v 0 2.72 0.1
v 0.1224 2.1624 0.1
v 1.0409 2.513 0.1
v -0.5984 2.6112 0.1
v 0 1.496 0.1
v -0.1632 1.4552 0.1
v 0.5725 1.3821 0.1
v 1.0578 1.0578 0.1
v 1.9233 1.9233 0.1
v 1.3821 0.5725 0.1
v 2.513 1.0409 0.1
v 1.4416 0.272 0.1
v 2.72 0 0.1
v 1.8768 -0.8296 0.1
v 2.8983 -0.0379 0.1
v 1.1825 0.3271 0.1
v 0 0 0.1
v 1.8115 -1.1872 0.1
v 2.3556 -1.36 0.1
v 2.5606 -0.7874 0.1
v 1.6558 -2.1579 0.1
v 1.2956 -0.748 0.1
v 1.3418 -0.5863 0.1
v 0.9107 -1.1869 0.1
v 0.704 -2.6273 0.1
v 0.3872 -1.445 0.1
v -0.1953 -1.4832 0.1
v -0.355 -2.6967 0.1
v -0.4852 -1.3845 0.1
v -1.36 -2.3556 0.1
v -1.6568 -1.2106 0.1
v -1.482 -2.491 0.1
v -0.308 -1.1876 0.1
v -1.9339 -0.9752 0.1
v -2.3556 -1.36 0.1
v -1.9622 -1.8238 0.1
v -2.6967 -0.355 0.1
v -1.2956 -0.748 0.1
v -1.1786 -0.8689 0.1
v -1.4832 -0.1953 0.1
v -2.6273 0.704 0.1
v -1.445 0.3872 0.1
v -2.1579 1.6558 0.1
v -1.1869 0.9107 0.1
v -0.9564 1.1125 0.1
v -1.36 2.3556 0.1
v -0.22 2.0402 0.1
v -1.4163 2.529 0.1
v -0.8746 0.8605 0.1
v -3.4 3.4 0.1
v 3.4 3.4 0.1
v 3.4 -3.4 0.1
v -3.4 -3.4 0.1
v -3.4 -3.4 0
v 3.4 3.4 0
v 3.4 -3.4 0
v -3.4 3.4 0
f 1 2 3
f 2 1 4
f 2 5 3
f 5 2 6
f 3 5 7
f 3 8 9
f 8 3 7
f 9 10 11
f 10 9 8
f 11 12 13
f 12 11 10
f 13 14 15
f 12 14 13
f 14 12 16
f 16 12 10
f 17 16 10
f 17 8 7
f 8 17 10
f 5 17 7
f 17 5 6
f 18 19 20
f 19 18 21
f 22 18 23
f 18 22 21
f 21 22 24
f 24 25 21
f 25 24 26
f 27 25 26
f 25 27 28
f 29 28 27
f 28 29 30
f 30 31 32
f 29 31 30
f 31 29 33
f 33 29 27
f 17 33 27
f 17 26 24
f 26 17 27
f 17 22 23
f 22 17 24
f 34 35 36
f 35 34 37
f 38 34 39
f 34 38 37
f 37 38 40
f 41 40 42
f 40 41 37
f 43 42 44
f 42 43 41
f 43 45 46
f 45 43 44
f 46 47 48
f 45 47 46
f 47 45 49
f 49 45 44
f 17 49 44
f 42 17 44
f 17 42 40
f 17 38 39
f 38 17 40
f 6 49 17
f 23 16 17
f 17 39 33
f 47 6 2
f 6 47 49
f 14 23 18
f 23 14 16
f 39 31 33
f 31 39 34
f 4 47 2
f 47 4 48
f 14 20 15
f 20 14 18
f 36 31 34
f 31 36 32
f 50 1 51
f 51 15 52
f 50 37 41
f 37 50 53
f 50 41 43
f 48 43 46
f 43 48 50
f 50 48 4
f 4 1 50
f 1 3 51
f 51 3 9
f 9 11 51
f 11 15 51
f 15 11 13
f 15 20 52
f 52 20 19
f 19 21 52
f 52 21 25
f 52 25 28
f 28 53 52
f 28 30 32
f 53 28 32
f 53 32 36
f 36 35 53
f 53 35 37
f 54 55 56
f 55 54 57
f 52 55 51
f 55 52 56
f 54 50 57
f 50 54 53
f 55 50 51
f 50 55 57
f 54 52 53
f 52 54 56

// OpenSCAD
use <../lib.scad>
function ldraw_lib__59718d() = [
// 0 Sticker  0.9 x  0.9 with Round Green/White Arrows
// 0 Name: 59718d.dat
// 0 Author: J.C. Tchang [tchang]
// 0 !LDRAW_ORG Part UPDATE 2025-09
// 0 !LICENSE Licensed under CC BY 4.0 : see CAreadme.txt
// 
// 0 BFC CERTIFY CCW
  [0,"BFC","CERTIFY"],
  [0,"BFC","CCW"],
// 
// 0 !KEYWORDS BrickLink 7991stk01, Rebrickable 59718
// 
// 0 !HISTORY 2012-03-30 [PTadmin] Official Update 2012-01
// 0 !HISTORY 2025-09-27 [OrionP] Changed winding to CCW
// 0 !HISTORY 2025-09-29 [OrionP] Official Update 2025-09
// 
// 4 2 2.6023 -0.25 6.2824 0 -0.25 6.8 -1.496 -0.25 6.528 0.306 -0.25 5.406
  [4,2,2.6023,-0.25,6.2824,0,-0.25,6.8,-1.496,-0.25,6.528,0.306,-0.25,5.406],
// 4 2 0.306 -0.25 5.406 -0.408 -0.25 3.638 0 -0.25 3.74 2.6023 -0.25 6.2824
  [4,2,0.306,-0.25,5.406,-0.408,-0.25,3.638,0,-0.25,3.74,2.6023,-0.25,6.2824],
// 3 2 2.6023 -0.25 6.2824 0 -0.25 3.74 1.4312 -0.25 3.4553
  [3,2,2.6023,-0.25,6.2824,0,-0.25,3.74,1.4312,-0.25,3.4553],
// 4 2 1.4312 -0.25 3.4553 2.6446 -0.25 2.6446 4.8083 -0.25 4.8083 2.6023 -0.25 6.2824
  [4,2,1.4312,-0.25,3.4553,2.6446,-0.25,2.6446,4.8083,-0.25,4.8083,2.6023,-0.25,6.2824],
// 4 2 3.4553 -0.25 1.4312 6.2824 -0.25 2.6023 4.8083 -0.25 4.8083 2.6446 -0.25 2.6446
  [4,2,3.4553,-0.25,1.4312,6.2824,-0.25,2.6023,4.8083,-0.25,4.8083,2.6446,-0.25,2.6446],
// 4 2 3.4553 -0.25 1.4312 3.604 -0.25 0.68 6.8 -0.25 0 6.2824 -0.25 2.6023
  [4,2,3.4553,-0.25,1.4312,3.604,-0.25,0.68,6.8,-0.25,0,6.2824,-0.25,2.6023],
// 3 2 6.8 -0.25 0 4.692 -0.25 -2.074 7.2457 -0.25 -0.0948
  [3,2,6.8,-0.25,0,4.692,-0.25,-2.074,7.2457,-0.25,-0.0948],
// 3 2 3.604 -0.25 0.68 4.692 -0.25 -2.074 6.8 -0.25 0
  [3,2,3.604,-0.25,0.68,4.692,-0.25,-2.074,6.8,-0.25,0],
// 3 2 4.692 -0.25 -2.074 3.604 -0.25 0.68 2.9562 -0.25 0.8178
  [3,2,4.692,-0.25,-2.074,3.604,-0.25,0.68,2.9562,-0.25,0.8178],
// 3 15 2.9562 -0.25 0.8178 3.604 -0.25 0.68 3.4553 -0.25 1.4312
  [3,15,2.9562,-0.25,0.8178,3.604,-0.25,0.68,3.4553,-0.25,1.4312],
// 3 15 0 -0.25 0 2.9562 -0.25 0.8178 3.4553 -0.25 1.4312
  [3,15,0,-0.25,0,2.9562,-0.25,0.8178,3.4553,-0.25,1.4312],
// 4 15 0 -0.25 0 3.4553 -0.25 1.4312 2.6446 -0.25 2.6446 1.4312 -0.25 3.4553
  [4,15,0,-0.25,0,3.4553,-0.25,1.4312,2.6446,-0.25,2.6446,1.4312,-0.25,3.4553],
// 4 15 1.4312 -0.25 3.4553 0 -0.25 3.74 -0.408 -0.25 3.638 0 -0.25 0
  [4,15,1.4312,-0.25,3.4553,0,-0.25,3.74,-0.408,-0.25,3.638,0,-0.25,0],
// 4 2 4.1396 -0.25 -5.3948 5.889 -0.25 -3.4 6.4014 -0.25 -1.9684 4.5287 -0.25 -2.968
  [4,2,4.1396,-0.25,-5.3948,5.889,-0.25,-3.4,6.4014,-0.25,-1.9684,4.5287,-0.25,-2.968],
// 4 2 4.5287 -0.25 -2.968 3.3546 -0.25 -1.4657 3.2389 -0.25 -1.87 4.1396 -0.25 -5.3948
  [4,2,4.5287,-0.25,-2.968,3.3546,-0.25,-1.4657,3.2389,-0.25,-1.87,4.1396,-0.25,-5.3948],
// 3 2 4.1396 -0.25 -5.3948 3.2389 -0.25 -1.87 2.2768 -0.25 -2.9672
  [3,2,4.1396,-0.25,-5.3948,3.2389,-0.25,-1.87,2.2768,-0.25,-2.9672],
// 4 2 2.2768 -0.25 -2.9672 0.968 -0.25 -3.6126 1.76 -0.25 -6.5683 4.1396 -0.25 -5.3948
  [4,2,2.2768,-0.25,-2.9672,0.968,-0.25,-3.6126,1.76,-0.25,-6.5683,4.1396,-0.25,-5.3948],
// 4 2 -0.4882 -0.25 -3.708 -0.8876 -0.25 -6.7418 1.76 -0.25 -6.5683 0.968 -0.25 -3.6126
  [4,2,-0.4882,-0.25,-3.708,-0.8876,-0.25,-6.7418,1.76,-0.25,-6.5683,0.968,-0.25,-3.6126],
// 4 2 -0.4882 -0.25 -3.708 -1.2131 -0.25 -3.4612 -3.4 -0.25 -5.889 -0.8876 -0.25 -6.7418
  [4,2,-0.4882,-0.25,-3.708,-1.2131,-0.25,-3.4612,-3.4,-0.25,-5.889,-0.8876,-0.25,-6.7418],
// 3 2 -3.4 -0.25 -5.889 -4.1421 -0.25 -3.0264 -3.705 -0.25 -6.2275
  [3,2,-3.4,-0.25,-5.889,-4.1421,-0.25,-3.0264,-3.705,-0.25,-6.2275],
// 3 2 -1.2131 -0.25 -3.4612 -4.1421 -0.25 -3.0264 -3.4 -0.25 -5.889
  [3,2,-1.2131,-0.25,-3.4612,-4.1421,-0.25,-3.0264,-3.4,-0.25,-5.889],
// 3 2 -4.1421 -0.25 -3.0264 -1.2131 -0.25 -3.4612 -0.7699 -0.25 -2.9691
  [3,2,-4.1421,-0.25,-3.0264,-1.2131,-0.25,-3.4612,-0.7699,-0.25,-2.9691],
// 3 15 -0.7699 -0.25 -2.9691 -1.2131 -0.25 -3.4612 -0.4882 -0.25 -3.708
  [3,15,-0.7699,-0.25,-2.9691,-1.2131,-0.25,-3.4612,-0.4882,-0.25,-3.708],
// 3 15 0 -0.25 0 -0.7699 -0.25 -2.9691 -0.4882 -0.25 -3.708
  [3,15,0,-0.25,0,-0.7699,-0.25,-2.9691,-0.4882,-0.25,-3.708],
// 4 15 0 -0.25 0 -0.4882 -0.25 -3.708 0.968 -0.25 -3.6126 2.2768 -0.25 -2.9672
  [4,15,0,-0.25,0,-0.4882,-0.25,-3.708,0.968,-0.25,-3.6126,2.2768,-0.25,-2.9672],
// 4 15 2.2768 -0.25 -2.9672 3.2389 -0.25 -1.87 3.3546 -0.25 -1.4657 0 -0.25 0
  [4,15,2.2768,-0.25,-2.9672,3.2389,-0.25,-1.87,3.3546,-0.25,-1.4657,0,-0.25,0],
// 4 2 -6.7418 -0.25 -0.8876 -5.889 -0.25 -3.4 -4.9054 -0.25 -4.5596 -4.8347 -0.25 -2.438
  [4,2,-6.7418,-0.25,-0.8876,-5.889,-0.25,-3.4,-4.9054,-0.25,-4.5596,-4.8347,-0.25,-2.438],
// 4 2 -4.8347 -0.25 -2.438 -2.9466 -0.25 -2.1723 -3.2389 -0.25 -1.87 -6.7418 -0.25 -0.8876
  [4,2,-4.8347,-0.25,-2.438,-2.9466,-0.25,-2.1723,-3.2389,-0.25,-1.87,-6.7418,-0.25,-0.8876],
// 3 2 -6.7418 -0.25 -0.8876 -3.2389 -0.25 -1.87 -3.708 -0.25 -0.4882
  [3,2,-6.7418,-0.25,-0.8876,-3.2389,-0.25,-1.87,-3.708,-0.25,-0.4882],
// 4 2 -3.708 -0.25 -0.4882 -3.6126 -0.25 0.968 -6.5683 -0.25 1.76 -6.7418 -0.25 -0.8876
  [4,2,-3.708,-0.25,-0.4882,-3.6126,-0.25,0.968,-6.5683,-0.25,1.76,-6.7418,-0.25,-0.8876],
// 4 2 -2.9672 -0.25 2.2768 -5.3948 -0.25 4.1396 -6.5683 -0.25 1.76 -3.6126 -0.25 0.968
  [4,2,-2.9672,-0.25,2.2768,-5.3948,-0.25,4.1396,-6.5683,-0.25,1.76,-3.6126,-0.25,0.968],
// 4 2 -2.9672 -0.25 2.2768 -2.3909 -0.25 2.7812 -3.4 -0.25 5.889 -5.3948 -0.25 4.1396
  [4,2,-2.9672,-0.25,2.2768,-2.3909,-0.25,2.7812,-3.4,-0.25,5.889,-5.3948,-0.25,4.1396],
// 3 2 -3.4 -0.25 5.889 -0.5499 -0.25 5.1004 -3.5407 -0.25 6.3224
  [3,2,-3.4,-0.25,5.889,-0.5499,-0.25,5.1004,-3.5407,-0.25,6.3224],
// 3 2 -2.3909 -0.25 2.7812 -0.5499 -0.25 5.1004 -3.4 -0.25 5.889
  [3,2,-2.3909,-0.25,2.7812,-0.5499,-0.25,5.1004,-3.4,-0.25,5.889],
// 3 2 -0.5499 -0.25 5.1004 -2.3909 -0.25 2.7812 -2.1864 -0.25 2.1513
  [3,2,-0.5499,-0.25,5.1004,-2.3909,-0.25,2.7812,-2.1864,-0.25,2.1513],
// 3 15 -2.1864 -0.25 2.1513 -2.3909 -0.25 2.7812 -2.9672 -0.25 2.2768
  [3,15,-2.1864,-0.25,2.1513,-2.3909,-0.25,2.7812,-2.9672,-0.25,2.2768],
// 3 15 0 -0.25 0 -2.1864 -0.25 2.1513 -2.9672 -0.25 2.2768
  [3,15,0,-0.25,0,-2.1864,-0.25,2.1513,-2.9672,-0.25,2.2768],
// 4 15 0 -0.25 0 -2.9672 -0.25 2.2768 -3.6126 -0.25 0.968 -3.708 -0.25 -0.4882
  [4,15,0,-0.25,0,-2.9672,-0.25,2.2768,-3.6126,-0.25,0.968,-3.708,-0.25,-0.4882],
// 4 15 -3.708 -0.25 -0.4882 -3.2389 -0.25 -1.87 -2.9466 -0.25 -2.1723 0 -0.25 0
  [4,15,-3.708,-0.25,-0.4882,-3.2389,-0.25,-1.87,-2.9466,-0.25,-2.1723,0,-0.25,0],
// 3 15 -0.408 -0.25 3.638 -2.1864 -0.25 2.1513 0 -0.25 0
  [3,15,-0.408,-0.25,3.638,-2.1864,-0.25,2.1513,0,-0.25,0],
// 3 15 3.3546 -0.25 -1.4657 2.9562 -0.25 0.8178 0 -0.25 0
  [3,15,3.3546,-0.25,-1.4657,2.9562,-0.25,0.8178,0,-0.25,0],
// 3 15 0 -0.25 0 -2.9466 -0.25 -2.1723 -0.7699 -0.25 -2.9691
  [3,15,0,-0.25,0,-2.9466,-0.25,-2.1723,-0.7699,-0.25,-2.9691],
// 4 15 0.306 -0.25 5.406 -0.5499 -0.25 5.1004 -2.1864 -0.25 2.1513 -0.408 -0.25 3.638
  [4,15,0.306,-0.25,5.406,-0.5499,-0.25,5.1004,-2.1864,-0.25,2.1513,-0.408,-0.25,3.638],
// 4 15 4.5287 -0.25 -2.968 4.692 -0.25 -2.074 2.9562 -0.25 0.8178 3.3546 -0.25 -1.4657
  [4,15,4.5287,-0.25,-2.968,4.692,-0.25,-2.074,2.9562,-0.25,0.8178,3.3546,-0.25,-1.4657],
// 4 15 -4.8347 -0.25 -2.438 -4.1421 -0.25 -3.0264 -0.7699 -0.25 -2.9691 -2.9466 -0.25 -2.1723
  [4,15,-4.8347,-0.25,-2.438,-4.1421,-0.25,-3.0264,-0.7699,-0.25,-2.9691,-2.9466,-0.25,-2.1723],
// 4 15 -1.496 -0.25 6.528 -3.5407 -0.25 6.3224 -0.5499 -0.25 5.1004 0.306 -0.25 5.406
  [4,15,-1.496,-0.25,6.528,-3.5407,-0.25,6.3224,-0.5499,-0.25,5.1004,0.306,-0.25,5.406],
// 4 15 6.4014 -0.25 -1.9684 7.2457 -0.25 -0.0948 4.692 -0.25 -2.074 4.5287 -0.25 -2.968
  [4,15,6.4014,-0.25,-1.9684,7.2457,-0.25,-0.0948,4.692,-0.25,-2.074,4.5287,-0.25,-2.968],
// 4 15 -4.8347 -0.25 -2.438 -4.9054 -0.25 -4.5596 -3.705 -0.25 -6.2275 -4.1421 -0.25 -3.0264
  [4,15,-4.8347,-0.25,-2.438,-4.9054,-0.25,-4.5596,-3.705,-0.25,-6.2275,-4.1421,-0.25,-3.0264],
// 3 15 -8.5 -0.25 8.5 0 -0.25 6.8 8.5 -0.25 8.5
  [3,15,-8.5,-0.25,8.5,0,-0.25,6.8,8.5,-0.25,8.5],
// 3 15 8.5 -0.25 8.5 7.2457 -0.25 -0.0948 8.5 -0.25 -8.5
  [3,15,8.5,-0.25,8.5,7.2457,-0.25,-0.0948,8.5,-0.25,-8.5],
// 4 15 -8.5 -0.25 -8.5 -6.7418 -0.25 -0.8876 -6.5683 -0.25 1.76 -8.5 -0.25 8.5
  [4,15,-8.5,-0.25,-8.5,-6.7418,-0.25,-0.8876,-6.5683,-0.25,1.76,-8.5,-0.25,8.5],
// 3 15 -8.5 -0.25 8.5 -6.5683 -0.25 1.76 -5.3948 -0.25 4.1396
  [3,15,-8.5,-0.25,8.5,-6.5683,-0.25,1.76,-5.3948,-0.25,4.1396],
// 4 15 -8.5 -0.25 8.5 -5.3948 -0.25 4.1396 -3.4 -0.25 5.889 -3.5407 -0.25 6.3224
  [4,15,-8.5,-0.25,8.5,-5.3948,-0.25,4.1396,-3.4,-0.25,5.889,-3.5407,-0.25,6.3224],
// 3 15 -8.5 -0.25 8.5 -3.5407 -0.25 6.3224 -1.496 -0.25 6.528
  [3,15,-8.5,-0.25,8.5,-3.5407,-0.25,6.3224,-1.496,-0.25,6.528],
// 3 15 -1.496 -0.25 6.528 0 -0.25 6.8 -8.5 -0.25 8.5
  [3,15,-1.496,-0.25,6.528,0,-0.25,6.8,-8.5,-0.25,8.5],
// 3 15 0 -0.25 6.8 2.6023 -0.25 6.2824 8.5 -0.25 8.5
  [3,15,0,-0.25,6.8,2.6023,-0.25,6.2824,8.5,-0.25,8.5],
// 3 15 8.5 -0.25 8.5 2.6023 -0.25 6.2824 4.8083 -0.25 4.8083
  [3,15,8.5,-0.25,8.5,2.6023,-0.25,6.2824,4.8083,-0.25,4.8083],
// 3 15 4.8083 -0.25 4.8083 6.2824 -0.25 2.6023 8.5 -0.25 8.5
  [3,15,4.8083,-0.25,4.8083,6.2824,-0.25,2.6023,8.5,-0.25,8.5],
// 4 15 8.5 -0.25 8.5 6.2824 -0.25 2.6023 6.8 -0.25 0 7.2457 -0.25 -0.0948
  [4,15,8.5,-0.25,8.5,6.2824,-0.25,2.6023,6.8,-0.25,0,7.2457,-0.25,-0.0948],
// 3 15 7.2457 -0.25 -0.0948 6.4014 -0.25 -1.9684 8.5 -0.25 -8.5
  [3,15,7.2457,-0.25,-0.0948,6.4014,-0.25,-1.9684,8.5,-0.25,-8.5],
// 3 15 8.5 -0.25 -8.5 6.4014 -0.25 -1.9684 5.889 -0.25 -3.4
  [3,15,8.5,-0.25,-8.5,6.4014,-0.25,-1.9684,5.889,-0.25,-3.4],
// 3 15 5.889 -0.25 -3.4 4.1396 -0.25 -5.3948 8.5 -0.25 -8.5
  [3,15,5.889,-0.25,-3.4,4.1396,-0.25,-5.3948,8.5,-0.25,-8.5],
// 3 15 8.5 -0.25 -8.5 4.1396 -0.25 -5.3948 1.76 -0.25 -6.5683
  [3,15,8.5,-0.25,-8.5,4.1396,-0.25,-5.3948,1.76,-0.25,-6.5683],
// 3 15 8.5 -0.25 -8.5 1.76 -0.25 -6.5683 -0.8876 -0.25 -6.7418
  [3,15,8.5,-0.25,-8.5,1.76,-0.25,-6.5683,-0.8876,-0.25,-6.7418],
// 3 15 -0.8876 -0.25 -6.7418 -8.5 -0.25 -8.5 8.5 -0.25 -8.5
  [3,15,-0.8876,-0.25,-6.7418,-8.5,-0.25,-8.5,8.5,-0.25,-8.5],
// 3 15 -0.8876 -0.25 -6.7418 -3.4 -0.25 -5.889 -3.705 -0.25 -6.2275
  [3,15,-0.8876,-0.25,-6.7418,-3.4,-0.25,-5.889,-3.705,-0.25,-6.2275],
// 3 15 -8.5 -0.25 -8.5 -0.8876 -0.25 -6.7418 -3.705 -0.25 -6.2275
  [3,15,-8.5,-0.25,-8.5,-0.8876,-0.25,-6.7418,-3.705,-0.25,-6.2275],
// 3 15 -8.5 -0.25 -8.5 -3.705 -0.25 -6.2275 -4.9054 -0.25 -4.5596
  [3,15,-8.5,-0.25,-8.5,-3.705,-0.25,-6.2275,-4.9054,-0.25,-4.5596],
// 3 15 -4.9054 -0.25 -4.5596 -5.889 -0.25 -3.4 -8.5 -0.25 -8.5
  [3,15,-4.9054,-0.25,-4.5596,-5.889,-0.25,-3.4,-8.5,-0.25,-8.5],
// 3 15 -8.5 -0.25 -8.5 -5.889 -0.25 -3.4 -6.7418 -0.25 -0.8876
  [3,15,-8.5,-0.25,-8.5,-5.889,-0.25,-3.4,-6.7418,-0.25,-0.8876],
// 0 // Box
// 4 15 8.5 0 8.5 8.5 0 -8.5 -8.5 0 -8.5 -8.5 0 8.5
  [4,15,8.5,0,8.5,8.5,0,-8.5,-8.5,0,-8.5,-8.5,0,8.5],
// 4 15 8.5 -0.25 8.5 8.5 -0.25 -8.5 8.5 0 -8.5 8.5 0 8.5
  [4,15,8.5,-0.25,8.5,8.5,-0.25,-8.5,8.5,0,-8.5,8.5,0,8.5],
// 4 15 -8.5 0 8.5 -8.5 0 -8.5 -8.5 -0.25 -8.5 -8.5 -0.25 8.5
  [4,15,-8.5,0,8.5,-8.5,0,-8.5,-8.5,-0.25,-8.5,-8.5,-0.25,8.5],
// 4 15 8.5 0 8.5 -8.5 0 8.5 -8.5 -0.25 8.5 8.5 -0.25 8.5
  [4,15,8.5,0,8.5,-8.5,0,8.5,-8.5,-0.25,8.5,8.5,-0.25,8.5],
// 4 15 8.5 -0.25 -8.5 -8.5 -0.25 -8.5 -8.5 0 -8.5 8.5 0 -8.5
  [4,15,8.5,-0.25,-8.5,-8.5,-0.25,-8.5,-8.5,0,-8.5,8.5,0,-8.5],
// 0 //
];
module ldraw_lib__59718d(step=0, col=false, unit=2/5, alt=false, line=0.2, solid=!$preview)
    makepoly(ldraw_lib__59718d(), step=step, col=col, unit=unit, alt=alt, line=line, solid=solid);
ldraw_lib__59718d(line=0.2);
